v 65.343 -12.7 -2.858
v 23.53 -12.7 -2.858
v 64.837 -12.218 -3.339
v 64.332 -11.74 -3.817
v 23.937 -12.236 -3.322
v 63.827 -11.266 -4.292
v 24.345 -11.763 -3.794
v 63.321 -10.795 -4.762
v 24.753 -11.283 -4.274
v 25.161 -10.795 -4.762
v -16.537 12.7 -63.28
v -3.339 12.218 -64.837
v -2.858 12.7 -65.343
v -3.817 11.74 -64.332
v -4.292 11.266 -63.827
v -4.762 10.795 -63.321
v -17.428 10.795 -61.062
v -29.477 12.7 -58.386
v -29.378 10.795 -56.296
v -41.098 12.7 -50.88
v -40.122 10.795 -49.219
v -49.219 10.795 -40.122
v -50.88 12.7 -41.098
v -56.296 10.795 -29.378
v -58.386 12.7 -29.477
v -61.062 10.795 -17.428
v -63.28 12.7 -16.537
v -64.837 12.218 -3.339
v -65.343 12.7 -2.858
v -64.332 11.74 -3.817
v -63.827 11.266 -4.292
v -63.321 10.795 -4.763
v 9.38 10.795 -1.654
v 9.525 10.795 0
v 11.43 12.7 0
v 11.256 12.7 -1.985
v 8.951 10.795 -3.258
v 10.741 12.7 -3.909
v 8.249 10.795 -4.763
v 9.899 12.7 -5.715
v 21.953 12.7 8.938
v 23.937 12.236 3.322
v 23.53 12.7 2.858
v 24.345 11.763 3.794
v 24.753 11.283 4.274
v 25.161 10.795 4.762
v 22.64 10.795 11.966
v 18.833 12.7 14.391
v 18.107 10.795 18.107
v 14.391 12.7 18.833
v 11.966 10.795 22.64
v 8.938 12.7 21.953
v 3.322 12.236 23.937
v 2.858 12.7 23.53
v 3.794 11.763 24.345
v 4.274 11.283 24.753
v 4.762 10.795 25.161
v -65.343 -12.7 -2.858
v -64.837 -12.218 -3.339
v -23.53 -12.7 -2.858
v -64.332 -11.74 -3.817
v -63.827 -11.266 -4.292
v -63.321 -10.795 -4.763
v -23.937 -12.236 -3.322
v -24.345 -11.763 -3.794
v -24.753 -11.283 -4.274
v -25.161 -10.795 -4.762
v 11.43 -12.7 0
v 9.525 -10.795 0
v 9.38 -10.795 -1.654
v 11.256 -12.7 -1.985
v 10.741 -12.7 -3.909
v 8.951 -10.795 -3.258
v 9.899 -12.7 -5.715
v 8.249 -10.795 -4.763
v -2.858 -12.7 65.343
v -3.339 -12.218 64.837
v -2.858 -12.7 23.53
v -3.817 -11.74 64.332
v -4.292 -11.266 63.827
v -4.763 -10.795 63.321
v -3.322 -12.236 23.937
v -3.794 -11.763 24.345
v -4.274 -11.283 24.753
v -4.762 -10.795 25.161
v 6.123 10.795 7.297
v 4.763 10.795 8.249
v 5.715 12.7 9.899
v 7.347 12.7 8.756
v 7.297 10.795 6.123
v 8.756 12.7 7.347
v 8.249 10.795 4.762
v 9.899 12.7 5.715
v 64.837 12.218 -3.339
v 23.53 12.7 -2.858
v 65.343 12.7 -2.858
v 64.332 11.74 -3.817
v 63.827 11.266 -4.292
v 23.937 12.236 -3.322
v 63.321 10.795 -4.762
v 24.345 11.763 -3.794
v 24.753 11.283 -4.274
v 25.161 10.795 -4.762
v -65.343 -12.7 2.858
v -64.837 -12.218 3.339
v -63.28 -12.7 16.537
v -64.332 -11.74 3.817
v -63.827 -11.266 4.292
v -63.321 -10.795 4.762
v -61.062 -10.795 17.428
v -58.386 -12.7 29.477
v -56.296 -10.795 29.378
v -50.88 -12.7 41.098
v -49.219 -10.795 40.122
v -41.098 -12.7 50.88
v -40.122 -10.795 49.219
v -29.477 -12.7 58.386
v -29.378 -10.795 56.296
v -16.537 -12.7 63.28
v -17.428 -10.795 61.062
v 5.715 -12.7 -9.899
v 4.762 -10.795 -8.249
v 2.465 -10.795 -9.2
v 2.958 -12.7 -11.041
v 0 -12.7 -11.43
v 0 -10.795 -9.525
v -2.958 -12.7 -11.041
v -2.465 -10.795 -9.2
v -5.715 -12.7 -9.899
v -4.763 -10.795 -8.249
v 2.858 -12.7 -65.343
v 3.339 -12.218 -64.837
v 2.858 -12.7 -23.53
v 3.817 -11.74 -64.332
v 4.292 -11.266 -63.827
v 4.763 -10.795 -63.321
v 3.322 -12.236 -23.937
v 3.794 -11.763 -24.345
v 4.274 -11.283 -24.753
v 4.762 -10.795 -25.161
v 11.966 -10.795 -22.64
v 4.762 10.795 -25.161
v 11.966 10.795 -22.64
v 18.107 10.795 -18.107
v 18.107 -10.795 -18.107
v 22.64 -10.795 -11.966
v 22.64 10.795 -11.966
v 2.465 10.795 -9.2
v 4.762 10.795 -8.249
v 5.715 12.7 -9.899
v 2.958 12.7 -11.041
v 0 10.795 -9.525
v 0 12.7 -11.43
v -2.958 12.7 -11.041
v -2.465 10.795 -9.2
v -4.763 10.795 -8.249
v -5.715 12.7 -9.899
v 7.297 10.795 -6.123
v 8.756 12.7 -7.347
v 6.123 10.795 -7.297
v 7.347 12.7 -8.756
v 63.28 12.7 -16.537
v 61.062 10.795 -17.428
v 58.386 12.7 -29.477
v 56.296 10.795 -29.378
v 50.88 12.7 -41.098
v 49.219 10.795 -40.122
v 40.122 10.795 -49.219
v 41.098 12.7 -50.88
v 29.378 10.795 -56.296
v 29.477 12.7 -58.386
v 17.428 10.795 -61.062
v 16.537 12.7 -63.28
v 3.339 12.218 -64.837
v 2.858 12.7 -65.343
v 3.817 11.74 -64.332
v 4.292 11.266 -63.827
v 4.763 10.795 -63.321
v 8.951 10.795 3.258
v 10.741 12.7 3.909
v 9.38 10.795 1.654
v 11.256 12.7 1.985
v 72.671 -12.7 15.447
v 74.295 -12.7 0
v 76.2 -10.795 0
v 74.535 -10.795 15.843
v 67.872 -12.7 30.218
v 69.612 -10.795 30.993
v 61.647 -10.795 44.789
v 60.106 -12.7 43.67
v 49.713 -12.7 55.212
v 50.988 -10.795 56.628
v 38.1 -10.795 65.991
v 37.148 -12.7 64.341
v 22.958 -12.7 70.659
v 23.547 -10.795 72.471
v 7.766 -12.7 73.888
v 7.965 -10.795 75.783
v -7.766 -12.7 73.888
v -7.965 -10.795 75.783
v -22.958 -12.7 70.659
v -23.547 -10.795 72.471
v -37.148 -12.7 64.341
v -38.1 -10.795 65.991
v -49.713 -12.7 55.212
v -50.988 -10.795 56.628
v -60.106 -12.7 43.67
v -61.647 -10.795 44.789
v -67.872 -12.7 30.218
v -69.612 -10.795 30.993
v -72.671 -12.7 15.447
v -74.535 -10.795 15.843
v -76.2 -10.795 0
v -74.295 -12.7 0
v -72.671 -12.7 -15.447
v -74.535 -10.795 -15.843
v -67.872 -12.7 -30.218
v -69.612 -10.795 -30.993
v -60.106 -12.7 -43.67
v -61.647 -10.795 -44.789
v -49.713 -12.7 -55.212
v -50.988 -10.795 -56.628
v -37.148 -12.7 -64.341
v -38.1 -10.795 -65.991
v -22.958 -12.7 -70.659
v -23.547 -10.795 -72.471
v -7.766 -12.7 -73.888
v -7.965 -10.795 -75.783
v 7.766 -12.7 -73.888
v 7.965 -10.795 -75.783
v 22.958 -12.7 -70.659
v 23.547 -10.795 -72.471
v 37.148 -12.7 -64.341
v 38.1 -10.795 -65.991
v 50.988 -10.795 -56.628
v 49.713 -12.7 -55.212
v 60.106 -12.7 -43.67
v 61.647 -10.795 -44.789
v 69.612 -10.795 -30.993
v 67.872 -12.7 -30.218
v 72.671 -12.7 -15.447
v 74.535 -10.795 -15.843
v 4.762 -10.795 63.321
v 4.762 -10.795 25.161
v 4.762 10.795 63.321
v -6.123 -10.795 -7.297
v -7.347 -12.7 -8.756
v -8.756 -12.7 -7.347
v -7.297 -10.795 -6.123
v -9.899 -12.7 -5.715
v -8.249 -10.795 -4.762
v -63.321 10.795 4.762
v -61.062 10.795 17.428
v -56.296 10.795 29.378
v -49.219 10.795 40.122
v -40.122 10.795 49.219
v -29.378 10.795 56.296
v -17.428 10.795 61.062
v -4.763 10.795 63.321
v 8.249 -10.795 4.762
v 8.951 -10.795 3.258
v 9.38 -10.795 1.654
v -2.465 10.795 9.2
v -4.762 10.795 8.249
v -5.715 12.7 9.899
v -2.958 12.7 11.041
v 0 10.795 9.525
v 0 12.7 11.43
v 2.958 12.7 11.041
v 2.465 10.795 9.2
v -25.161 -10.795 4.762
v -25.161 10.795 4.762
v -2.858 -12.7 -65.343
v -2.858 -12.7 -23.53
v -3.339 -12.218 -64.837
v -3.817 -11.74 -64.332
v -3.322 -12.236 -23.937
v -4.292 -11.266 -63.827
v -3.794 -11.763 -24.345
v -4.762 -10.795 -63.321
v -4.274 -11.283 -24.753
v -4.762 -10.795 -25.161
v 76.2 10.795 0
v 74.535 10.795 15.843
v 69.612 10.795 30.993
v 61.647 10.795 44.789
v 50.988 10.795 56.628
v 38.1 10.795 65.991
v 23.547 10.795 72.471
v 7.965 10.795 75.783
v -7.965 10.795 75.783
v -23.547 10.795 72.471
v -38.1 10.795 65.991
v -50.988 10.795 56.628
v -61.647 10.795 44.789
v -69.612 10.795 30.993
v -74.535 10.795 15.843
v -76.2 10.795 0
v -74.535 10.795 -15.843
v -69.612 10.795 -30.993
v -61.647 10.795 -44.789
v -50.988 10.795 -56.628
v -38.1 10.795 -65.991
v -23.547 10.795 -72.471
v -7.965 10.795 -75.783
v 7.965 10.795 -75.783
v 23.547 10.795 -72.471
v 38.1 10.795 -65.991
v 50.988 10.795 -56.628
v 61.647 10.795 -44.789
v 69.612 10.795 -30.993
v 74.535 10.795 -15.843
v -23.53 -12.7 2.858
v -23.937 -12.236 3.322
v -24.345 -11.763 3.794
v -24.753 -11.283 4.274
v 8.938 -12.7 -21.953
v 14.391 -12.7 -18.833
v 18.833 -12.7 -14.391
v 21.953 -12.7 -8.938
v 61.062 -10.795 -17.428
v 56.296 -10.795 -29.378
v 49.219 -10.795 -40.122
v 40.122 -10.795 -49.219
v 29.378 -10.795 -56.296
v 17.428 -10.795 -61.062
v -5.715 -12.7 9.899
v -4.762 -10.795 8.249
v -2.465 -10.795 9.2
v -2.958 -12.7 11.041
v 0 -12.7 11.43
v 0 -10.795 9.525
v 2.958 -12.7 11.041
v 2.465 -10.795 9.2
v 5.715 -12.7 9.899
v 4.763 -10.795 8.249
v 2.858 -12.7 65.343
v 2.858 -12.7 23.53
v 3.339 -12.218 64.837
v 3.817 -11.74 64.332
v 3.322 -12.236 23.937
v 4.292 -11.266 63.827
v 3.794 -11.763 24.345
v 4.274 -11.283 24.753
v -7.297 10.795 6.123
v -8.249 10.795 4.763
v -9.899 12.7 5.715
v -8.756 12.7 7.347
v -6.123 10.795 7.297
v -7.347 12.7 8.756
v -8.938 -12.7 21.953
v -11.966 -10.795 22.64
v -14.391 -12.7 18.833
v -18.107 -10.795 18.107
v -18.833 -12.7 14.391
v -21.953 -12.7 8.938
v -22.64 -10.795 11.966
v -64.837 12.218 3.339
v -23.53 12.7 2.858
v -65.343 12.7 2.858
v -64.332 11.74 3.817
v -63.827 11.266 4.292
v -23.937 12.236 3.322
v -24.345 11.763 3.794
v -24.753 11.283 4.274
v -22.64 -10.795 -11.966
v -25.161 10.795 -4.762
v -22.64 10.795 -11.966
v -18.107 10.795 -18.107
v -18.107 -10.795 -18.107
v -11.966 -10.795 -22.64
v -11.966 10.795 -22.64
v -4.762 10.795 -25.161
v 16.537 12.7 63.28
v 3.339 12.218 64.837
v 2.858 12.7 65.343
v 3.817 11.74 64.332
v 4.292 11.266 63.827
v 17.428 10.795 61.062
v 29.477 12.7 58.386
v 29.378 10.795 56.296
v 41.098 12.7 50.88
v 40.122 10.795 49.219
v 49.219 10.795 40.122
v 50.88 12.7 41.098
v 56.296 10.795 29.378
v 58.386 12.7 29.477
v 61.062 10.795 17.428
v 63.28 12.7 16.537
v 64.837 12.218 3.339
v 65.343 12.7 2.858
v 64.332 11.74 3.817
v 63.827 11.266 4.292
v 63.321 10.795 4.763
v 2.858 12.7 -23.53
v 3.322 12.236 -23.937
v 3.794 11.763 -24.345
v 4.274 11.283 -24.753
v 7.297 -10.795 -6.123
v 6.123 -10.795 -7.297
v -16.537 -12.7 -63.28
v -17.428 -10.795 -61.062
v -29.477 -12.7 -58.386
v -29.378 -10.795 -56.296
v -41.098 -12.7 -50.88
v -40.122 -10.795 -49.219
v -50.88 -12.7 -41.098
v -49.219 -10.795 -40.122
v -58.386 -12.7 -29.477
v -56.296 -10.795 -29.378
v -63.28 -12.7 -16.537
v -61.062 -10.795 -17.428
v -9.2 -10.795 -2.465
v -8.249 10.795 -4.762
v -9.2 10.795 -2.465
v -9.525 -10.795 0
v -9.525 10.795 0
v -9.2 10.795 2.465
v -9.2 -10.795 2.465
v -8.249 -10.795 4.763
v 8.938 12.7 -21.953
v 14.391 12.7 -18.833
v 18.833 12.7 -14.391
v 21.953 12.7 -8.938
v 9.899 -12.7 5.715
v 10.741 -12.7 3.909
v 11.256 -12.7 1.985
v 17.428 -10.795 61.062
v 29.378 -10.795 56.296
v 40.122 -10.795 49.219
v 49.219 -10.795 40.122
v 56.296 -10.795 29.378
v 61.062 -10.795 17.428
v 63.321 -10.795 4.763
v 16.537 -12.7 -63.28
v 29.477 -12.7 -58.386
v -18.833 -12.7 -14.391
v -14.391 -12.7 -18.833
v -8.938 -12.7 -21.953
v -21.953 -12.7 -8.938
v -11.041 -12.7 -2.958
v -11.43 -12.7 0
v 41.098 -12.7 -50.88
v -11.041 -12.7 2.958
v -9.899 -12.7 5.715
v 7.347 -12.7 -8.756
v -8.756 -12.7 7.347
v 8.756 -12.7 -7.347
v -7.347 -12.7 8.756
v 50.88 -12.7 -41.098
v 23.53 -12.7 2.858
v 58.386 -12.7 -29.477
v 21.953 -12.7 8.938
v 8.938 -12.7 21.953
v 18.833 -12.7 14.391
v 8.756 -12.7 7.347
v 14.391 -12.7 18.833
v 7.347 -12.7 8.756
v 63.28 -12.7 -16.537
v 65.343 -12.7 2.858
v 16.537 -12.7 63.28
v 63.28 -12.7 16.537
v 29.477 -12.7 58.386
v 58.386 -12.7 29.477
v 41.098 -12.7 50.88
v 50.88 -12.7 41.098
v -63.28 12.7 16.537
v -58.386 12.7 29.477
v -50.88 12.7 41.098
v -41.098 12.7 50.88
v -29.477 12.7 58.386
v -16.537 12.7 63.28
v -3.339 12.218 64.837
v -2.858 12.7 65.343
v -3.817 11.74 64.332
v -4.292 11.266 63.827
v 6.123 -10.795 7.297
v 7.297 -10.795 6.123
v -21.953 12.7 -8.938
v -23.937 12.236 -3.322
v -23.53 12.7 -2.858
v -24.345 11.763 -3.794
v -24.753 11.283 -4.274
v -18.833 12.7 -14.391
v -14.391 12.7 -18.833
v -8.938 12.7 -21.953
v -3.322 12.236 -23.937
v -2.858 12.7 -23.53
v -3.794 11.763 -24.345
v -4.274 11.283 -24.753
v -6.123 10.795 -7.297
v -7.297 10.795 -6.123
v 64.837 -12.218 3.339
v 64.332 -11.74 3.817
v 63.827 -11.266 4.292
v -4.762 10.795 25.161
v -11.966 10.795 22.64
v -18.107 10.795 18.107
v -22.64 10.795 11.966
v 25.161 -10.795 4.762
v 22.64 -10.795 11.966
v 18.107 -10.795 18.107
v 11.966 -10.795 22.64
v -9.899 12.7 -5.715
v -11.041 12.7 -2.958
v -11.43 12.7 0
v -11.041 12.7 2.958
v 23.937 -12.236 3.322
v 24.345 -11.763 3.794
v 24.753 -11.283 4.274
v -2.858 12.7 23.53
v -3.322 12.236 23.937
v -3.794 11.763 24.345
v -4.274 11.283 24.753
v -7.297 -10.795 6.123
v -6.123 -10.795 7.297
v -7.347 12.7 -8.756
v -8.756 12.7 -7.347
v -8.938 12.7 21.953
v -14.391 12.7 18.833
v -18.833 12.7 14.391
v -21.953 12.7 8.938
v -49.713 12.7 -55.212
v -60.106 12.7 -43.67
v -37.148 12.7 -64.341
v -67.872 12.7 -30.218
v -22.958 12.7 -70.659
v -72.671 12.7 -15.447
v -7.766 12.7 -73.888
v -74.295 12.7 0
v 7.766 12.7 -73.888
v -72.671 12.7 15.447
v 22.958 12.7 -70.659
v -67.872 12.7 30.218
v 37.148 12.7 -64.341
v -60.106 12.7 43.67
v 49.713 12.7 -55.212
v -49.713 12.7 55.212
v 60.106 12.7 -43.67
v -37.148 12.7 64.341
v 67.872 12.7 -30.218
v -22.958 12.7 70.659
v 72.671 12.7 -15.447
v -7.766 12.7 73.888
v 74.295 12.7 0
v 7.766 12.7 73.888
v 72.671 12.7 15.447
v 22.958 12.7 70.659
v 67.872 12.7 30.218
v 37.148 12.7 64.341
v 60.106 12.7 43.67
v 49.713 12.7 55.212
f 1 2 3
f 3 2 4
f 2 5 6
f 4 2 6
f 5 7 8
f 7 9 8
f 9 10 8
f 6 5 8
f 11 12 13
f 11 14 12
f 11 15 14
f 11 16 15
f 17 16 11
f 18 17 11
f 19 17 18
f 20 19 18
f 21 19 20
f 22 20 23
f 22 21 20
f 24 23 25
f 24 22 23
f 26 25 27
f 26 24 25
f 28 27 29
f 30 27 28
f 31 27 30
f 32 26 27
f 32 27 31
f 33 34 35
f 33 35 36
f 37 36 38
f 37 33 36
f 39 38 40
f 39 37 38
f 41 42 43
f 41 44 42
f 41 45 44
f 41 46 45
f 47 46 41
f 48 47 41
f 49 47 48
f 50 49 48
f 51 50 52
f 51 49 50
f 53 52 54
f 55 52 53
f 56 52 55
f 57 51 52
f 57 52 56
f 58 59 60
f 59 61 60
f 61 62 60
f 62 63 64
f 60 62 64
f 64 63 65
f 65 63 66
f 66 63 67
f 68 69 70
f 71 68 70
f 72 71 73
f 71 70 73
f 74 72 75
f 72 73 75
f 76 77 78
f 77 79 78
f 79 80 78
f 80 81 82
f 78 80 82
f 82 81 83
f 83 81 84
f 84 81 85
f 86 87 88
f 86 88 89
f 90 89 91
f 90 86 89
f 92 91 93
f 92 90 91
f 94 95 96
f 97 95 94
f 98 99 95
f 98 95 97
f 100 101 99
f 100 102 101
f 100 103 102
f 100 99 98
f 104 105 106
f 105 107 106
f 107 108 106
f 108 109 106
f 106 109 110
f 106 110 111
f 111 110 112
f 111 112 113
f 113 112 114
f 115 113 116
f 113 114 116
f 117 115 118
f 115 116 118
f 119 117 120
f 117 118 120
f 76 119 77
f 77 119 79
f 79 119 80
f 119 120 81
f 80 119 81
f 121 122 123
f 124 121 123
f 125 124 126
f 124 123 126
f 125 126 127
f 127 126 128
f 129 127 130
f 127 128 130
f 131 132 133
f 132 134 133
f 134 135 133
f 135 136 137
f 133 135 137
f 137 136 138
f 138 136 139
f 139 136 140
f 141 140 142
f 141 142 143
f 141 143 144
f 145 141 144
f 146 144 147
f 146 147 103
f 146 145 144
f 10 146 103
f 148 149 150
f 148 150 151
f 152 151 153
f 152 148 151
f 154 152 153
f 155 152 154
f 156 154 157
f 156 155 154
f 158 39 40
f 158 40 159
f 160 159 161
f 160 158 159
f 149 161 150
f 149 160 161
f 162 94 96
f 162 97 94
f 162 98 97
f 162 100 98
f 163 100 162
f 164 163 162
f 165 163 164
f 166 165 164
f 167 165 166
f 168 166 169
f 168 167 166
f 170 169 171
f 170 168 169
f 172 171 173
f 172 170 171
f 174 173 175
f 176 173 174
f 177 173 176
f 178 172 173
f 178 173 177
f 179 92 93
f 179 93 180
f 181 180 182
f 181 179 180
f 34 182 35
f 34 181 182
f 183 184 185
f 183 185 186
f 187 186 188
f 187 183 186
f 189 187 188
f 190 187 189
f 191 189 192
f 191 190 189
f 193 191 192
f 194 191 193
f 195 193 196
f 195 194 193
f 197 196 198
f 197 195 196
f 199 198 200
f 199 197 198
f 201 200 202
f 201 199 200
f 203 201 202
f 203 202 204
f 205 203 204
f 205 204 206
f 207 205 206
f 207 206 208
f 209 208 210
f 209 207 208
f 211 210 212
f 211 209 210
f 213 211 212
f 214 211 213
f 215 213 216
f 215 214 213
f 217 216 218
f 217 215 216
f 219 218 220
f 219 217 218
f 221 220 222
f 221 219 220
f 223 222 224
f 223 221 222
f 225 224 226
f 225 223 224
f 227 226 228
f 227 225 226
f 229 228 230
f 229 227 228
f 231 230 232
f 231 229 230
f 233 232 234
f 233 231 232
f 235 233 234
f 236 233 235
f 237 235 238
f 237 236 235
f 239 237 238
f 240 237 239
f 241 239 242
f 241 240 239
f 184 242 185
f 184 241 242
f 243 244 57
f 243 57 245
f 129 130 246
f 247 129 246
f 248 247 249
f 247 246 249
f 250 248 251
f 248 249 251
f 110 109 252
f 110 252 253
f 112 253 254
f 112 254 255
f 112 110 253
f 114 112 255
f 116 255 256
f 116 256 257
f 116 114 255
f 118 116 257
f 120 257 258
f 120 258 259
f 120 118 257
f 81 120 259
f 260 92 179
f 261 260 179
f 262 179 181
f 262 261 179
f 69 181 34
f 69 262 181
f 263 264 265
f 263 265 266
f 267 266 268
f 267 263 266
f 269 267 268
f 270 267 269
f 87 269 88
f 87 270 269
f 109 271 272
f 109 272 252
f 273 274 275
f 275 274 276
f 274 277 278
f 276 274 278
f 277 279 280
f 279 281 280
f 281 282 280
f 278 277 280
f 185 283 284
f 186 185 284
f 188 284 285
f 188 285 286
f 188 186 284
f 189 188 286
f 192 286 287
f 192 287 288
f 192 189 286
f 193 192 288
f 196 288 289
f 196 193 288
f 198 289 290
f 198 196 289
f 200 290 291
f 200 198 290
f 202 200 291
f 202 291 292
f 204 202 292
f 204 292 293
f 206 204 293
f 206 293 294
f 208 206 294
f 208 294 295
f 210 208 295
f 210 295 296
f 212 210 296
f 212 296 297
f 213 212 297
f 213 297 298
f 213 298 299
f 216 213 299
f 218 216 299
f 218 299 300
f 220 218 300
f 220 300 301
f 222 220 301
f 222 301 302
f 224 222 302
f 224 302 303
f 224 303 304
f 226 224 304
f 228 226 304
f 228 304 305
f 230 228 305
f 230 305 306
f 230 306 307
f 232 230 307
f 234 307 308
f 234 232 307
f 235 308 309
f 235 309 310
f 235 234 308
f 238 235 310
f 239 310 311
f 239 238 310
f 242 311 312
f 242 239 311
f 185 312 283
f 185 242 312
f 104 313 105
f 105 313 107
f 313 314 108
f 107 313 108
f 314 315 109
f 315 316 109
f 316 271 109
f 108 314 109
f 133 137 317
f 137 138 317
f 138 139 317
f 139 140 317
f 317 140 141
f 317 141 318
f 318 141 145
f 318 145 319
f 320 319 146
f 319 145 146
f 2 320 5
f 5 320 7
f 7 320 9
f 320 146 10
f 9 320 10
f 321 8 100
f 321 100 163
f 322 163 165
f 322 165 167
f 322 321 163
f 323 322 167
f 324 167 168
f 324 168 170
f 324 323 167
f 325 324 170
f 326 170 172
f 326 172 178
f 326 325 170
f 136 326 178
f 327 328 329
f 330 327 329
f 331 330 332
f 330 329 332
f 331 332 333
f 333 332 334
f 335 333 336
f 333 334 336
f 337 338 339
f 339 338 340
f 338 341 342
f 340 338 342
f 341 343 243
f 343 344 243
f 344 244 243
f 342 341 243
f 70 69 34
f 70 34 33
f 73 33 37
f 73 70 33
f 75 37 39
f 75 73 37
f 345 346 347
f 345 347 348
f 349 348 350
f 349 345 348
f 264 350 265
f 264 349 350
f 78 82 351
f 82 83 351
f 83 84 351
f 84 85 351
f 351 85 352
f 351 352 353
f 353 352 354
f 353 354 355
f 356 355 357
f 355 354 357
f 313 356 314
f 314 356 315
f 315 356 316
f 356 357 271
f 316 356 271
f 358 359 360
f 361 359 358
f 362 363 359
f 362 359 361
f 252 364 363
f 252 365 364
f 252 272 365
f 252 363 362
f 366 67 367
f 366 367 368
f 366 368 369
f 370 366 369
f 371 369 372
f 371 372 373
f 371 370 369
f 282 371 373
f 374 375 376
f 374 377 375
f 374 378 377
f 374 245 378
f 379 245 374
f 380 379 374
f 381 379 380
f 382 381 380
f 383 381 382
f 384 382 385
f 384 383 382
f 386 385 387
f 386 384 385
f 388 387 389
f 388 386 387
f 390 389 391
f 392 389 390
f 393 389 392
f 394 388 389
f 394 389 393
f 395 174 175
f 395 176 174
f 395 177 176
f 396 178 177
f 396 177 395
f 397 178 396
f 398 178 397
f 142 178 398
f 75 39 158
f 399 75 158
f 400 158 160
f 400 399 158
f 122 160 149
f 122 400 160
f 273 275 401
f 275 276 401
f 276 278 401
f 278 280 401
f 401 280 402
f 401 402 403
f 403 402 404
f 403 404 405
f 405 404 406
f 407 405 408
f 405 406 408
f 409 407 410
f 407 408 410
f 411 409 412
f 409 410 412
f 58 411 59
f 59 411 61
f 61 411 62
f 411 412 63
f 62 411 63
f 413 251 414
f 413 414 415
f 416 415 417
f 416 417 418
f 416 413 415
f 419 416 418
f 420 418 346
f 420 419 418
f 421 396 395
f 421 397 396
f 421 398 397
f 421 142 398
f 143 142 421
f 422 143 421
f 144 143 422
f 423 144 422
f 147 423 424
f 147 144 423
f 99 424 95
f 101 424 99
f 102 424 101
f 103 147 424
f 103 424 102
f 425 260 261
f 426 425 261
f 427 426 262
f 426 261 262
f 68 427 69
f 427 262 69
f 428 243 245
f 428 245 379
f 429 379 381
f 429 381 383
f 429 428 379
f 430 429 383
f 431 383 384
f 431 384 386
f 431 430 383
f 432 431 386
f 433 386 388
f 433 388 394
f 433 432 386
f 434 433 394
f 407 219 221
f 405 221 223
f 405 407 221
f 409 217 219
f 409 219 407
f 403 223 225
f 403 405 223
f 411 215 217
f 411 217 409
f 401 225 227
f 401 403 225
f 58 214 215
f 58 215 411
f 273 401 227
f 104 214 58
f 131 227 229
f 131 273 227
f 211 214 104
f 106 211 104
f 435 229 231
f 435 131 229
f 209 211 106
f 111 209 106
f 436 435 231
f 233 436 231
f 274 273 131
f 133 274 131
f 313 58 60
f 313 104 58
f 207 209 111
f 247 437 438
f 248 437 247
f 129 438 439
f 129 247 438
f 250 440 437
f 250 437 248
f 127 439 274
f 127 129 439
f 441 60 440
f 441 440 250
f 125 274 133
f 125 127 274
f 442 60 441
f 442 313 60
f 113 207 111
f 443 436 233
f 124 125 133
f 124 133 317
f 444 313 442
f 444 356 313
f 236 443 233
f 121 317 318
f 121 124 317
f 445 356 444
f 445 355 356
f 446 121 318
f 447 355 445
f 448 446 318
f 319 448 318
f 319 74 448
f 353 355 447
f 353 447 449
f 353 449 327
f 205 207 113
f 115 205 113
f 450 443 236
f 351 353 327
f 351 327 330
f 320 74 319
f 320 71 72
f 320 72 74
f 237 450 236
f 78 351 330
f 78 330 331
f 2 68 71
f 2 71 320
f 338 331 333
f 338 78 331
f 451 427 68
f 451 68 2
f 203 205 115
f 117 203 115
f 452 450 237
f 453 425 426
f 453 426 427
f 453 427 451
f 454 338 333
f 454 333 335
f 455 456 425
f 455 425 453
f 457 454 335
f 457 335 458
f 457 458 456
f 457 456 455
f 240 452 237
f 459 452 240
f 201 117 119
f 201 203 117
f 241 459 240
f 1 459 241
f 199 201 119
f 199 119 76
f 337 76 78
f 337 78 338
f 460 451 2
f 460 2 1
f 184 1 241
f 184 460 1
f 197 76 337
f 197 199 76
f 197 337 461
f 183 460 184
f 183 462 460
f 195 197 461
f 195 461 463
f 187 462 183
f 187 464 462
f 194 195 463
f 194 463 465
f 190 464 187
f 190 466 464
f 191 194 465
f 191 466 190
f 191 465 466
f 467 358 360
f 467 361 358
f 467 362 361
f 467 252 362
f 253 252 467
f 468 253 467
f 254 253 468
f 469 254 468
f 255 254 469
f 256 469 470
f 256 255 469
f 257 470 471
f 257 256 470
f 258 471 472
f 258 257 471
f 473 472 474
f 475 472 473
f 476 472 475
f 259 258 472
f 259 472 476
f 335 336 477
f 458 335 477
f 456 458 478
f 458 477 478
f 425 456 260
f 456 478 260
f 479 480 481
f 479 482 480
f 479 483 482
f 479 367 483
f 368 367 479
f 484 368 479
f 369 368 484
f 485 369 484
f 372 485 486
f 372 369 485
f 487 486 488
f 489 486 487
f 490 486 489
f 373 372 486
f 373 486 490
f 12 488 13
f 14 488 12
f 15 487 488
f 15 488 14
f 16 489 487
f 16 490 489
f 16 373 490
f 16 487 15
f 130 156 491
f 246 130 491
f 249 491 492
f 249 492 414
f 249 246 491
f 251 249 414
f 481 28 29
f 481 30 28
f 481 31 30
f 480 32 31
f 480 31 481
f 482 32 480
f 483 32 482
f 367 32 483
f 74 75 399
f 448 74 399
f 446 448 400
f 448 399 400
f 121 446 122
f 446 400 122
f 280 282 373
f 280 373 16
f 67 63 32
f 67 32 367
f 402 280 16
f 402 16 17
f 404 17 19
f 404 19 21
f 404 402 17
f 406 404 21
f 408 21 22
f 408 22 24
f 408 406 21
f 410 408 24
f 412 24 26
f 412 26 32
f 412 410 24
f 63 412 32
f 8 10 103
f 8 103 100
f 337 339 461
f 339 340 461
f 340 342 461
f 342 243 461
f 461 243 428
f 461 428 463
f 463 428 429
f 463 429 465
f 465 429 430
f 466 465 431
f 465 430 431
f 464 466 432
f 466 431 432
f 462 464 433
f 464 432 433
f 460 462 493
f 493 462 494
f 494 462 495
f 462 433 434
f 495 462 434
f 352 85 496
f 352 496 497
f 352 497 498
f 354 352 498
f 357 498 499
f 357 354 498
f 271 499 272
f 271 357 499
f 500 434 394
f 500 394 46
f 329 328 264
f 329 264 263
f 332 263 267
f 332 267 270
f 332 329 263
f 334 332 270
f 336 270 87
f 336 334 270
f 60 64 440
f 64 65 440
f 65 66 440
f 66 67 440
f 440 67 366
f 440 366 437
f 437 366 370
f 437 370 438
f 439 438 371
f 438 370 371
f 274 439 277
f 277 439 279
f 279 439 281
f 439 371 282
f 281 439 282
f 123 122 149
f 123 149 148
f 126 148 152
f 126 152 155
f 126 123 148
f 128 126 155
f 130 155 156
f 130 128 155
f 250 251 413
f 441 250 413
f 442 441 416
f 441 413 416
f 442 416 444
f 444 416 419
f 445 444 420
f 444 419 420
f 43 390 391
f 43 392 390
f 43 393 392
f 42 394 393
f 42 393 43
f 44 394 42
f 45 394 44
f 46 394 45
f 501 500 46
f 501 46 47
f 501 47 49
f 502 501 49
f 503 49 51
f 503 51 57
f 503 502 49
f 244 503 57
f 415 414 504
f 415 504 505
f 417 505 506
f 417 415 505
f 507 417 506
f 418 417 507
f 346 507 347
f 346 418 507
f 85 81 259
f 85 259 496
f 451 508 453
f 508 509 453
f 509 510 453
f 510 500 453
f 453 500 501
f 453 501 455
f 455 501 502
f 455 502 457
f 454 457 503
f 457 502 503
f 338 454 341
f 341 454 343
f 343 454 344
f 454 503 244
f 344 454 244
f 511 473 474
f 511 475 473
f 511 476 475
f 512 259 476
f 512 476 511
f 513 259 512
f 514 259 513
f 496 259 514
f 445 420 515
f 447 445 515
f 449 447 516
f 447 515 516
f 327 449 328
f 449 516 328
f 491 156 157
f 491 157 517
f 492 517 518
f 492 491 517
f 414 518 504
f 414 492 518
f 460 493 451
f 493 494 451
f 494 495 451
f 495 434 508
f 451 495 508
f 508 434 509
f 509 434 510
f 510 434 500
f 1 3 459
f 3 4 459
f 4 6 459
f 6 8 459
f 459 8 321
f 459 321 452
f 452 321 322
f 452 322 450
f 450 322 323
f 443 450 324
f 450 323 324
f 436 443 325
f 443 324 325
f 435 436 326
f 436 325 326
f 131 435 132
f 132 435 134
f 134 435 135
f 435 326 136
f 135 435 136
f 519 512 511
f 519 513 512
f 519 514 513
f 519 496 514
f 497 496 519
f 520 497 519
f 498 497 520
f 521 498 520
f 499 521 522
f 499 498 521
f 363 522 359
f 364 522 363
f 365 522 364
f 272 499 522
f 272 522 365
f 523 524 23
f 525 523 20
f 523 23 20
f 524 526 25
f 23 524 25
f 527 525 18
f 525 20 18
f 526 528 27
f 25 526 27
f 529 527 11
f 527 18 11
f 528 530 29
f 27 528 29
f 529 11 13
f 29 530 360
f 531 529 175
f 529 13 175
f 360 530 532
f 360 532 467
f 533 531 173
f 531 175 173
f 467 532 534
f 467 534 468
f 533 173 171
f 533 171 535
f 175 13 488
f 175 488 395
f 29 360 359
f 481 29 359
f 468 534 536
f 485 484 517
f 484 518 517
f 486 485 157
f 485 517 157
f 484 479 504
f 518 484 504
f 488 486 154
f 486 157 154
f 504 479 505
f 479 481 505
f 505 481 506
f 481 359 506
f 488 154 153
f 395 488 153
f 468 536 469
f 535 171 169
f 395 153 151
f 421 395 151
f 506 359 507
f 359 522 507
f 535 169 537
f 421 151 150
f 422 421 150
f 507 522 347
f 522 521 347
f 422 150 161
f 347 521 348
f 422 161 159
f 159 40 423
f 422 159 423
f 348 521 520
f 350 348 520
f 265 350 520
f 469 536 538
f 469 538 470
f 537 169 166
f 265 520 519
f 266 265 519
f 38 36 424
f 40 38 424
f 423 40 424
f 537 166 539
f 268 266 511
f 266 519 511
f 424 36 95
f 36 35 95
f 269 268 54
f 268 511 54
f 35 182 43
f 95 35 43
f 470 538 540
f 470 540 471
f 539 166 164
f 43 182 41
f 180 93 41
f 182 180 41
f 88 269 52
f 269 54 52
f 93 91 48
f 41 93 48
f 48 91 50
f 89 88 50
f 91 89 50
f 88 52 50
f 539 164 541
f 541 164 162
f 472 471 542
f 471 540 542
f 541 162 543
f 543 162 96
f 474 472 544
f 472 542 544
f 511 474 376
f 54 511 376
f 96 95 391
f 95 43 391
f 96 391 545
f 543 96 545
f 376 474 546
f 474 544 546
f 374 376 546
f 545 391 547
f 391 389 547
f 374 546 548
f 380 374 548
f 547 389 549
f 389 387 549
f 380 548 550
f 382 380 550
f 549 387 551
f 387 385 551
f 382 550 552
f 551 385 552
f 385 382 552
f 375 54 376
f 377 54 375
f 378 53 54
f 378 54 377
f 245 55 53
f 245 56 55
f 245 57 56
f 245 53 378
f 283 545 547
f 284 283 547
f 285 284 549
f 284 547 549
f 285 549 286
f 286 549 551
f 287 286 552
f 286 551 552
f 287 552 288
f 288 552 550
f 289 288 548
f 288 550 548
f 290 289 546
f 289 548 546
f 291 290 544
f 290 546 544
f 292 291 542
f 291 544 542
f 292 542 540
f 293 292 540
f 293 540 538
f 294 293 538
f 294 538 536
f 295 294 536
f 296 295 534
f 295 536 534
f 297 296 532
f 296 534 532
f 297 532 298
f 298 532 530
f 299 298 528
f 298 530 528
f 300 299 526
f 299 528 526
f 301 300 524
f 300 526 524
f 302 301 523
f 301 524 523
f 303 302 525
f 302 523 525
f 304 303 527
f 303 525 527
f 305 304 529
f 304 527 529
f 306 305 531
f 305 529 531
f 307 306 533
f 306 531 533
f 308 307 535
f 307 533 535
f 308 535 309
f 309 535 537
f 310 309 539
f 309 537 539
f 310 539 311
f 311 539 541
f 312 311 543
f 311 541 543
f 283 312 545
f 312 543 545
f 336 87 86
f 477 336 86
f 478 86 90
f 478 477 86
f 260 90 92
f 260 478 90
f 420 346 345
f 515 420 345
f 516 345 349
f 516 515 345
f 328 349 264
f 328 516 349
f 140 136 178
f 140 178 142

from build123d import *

# Parameters (mm, degrees)
F0_R     = 76.2
F1_DEPTH = 12.7
F2_SIZE  = 1.905
F3_SIZE  = 1.905


with BuildPart() as f1:
    # F0 (on Front) → F1 (new body, symmetric)
    with BuildSketch(Plane.XZ):
        Circle(F0_R)
        with BuildLine():
            ThreePointArc((-4.7625, -63.321154), (-44.901281, -44.901281), (-63.321154, -4.7625))
            Line((-63.321154, -4.7625), (-25.160792, -4.7625))
            Line((-25.160792, -4.7625), (-8.248892, -4.7625))
            ThreePointArc((-8.248892, -4.7625), (-9.525, 0), (-8.248892, 4.7625))
            Line((-8.248892, 4.7625), (-25.160792, 4.7625))
            Line((-25.160792, 4.7625), (-63.321154, 4.7625))
            ThreePointArc((-63.321154, 4.7625), (-44.901281, 44.901281), (-4.7625, 63.321154))
            Line((-4.7625, 63.321154), (-4.7625, 25.160792))
            Line((-4.7625, 25.160792), (-4.7625, 8.248892))
            ThreePointArc((-4.7625, 8.248892), (0, 9.525), (4.7625, 8.248892))
            Line((4.7625, 8.248892), (4.7625, 25.160792))
            Line((4.7625, 25.160792), (4.7625, 63.321154))
            ThreePointArc((4.7625, 63.321154), (44.901281, 44.901281), (63.321154, 4.7625))
            Line((63.321154, 4.7625), (25.160792, 4.7625))
            Line((25.160792, 4.7625), (8.248892, 4.7625))
            ThreePointArc((8.248892, 4.7625), (9.200443, 2.465251), (9.525, 0))
            ThreePointArc((9.525, 0), (9.200443, -2.465251), (8.248892, -4.7625))
            Line((8.248892, -4.7625), (25.160792, -4.7625))
            Line((25.160792, -4.7625), (63.321154, -4.7625))
            ThreePointArc((63.321154, -4.7625), (44.901281, -44.901281), (4.7625, -63.321154))
            Line((4.7625, -63.321154), (4.7625, -25.160792))
            Line((4.7625, -25.160792), (4.7625, -8.248892))
            ThreePointArc((4.7625, -8.248892), (0, -9.525), (-4.7625, -8.248892))
            Line((-4.7625, -8.248892), (-4.7625, -25.160792))
            Line((-4.7625, -25.160792), (-4.7625, -63.321154))
        make_face(mode=Mode.SUBTRACT)
        with BuildLine():
            Line((-25.160792, 4.7625), (-8.248892, 4.7625))
            ThreePointArc((-8.248892, 4.7625), (-6.735192, 6.735192), (-4.7625, 8.248892))
            Line((-4.7625, 8.248892), (-4.7625, 25.160792))
            ThreePointArc((-4.7625, 25.160792), (-18.107275, 18.107275), (-25.160792, 4.7625))
        make_face()
        with BuildLine():
            Line((4.7625, 25.160792), (4.7625, 8.248892))
            ThreePointArc((4.7625, 8.248892), (6.735192, 6.735192), (8.248892, 4.7625))
            Line((8.248892, 4.7625), (25.160792, 4.7625))
            ThreePointArc((25.160792, 4.7625), (18.107275, 18.107275), (4.7625, 25.160792))
        make_face()
        with BuildLine():
            ThreePointArc((8.248892, -4.7625), (6.735192, -6.735192), (4.7625, -8.248892))
            Line((4.7625, -8.248892), (4.7625, -25.160792))
            ThreePointArc((4.7625, -25.160792), (18.107275, -18.107275), (25.160792, -4.7625))
            Line((25.160792, -4.7625), (8.248892, -4.7625))
        make_face()
        with BuildLine():
            Line((-8.248892, -4.7625), (-25.160792, -4.7625))
            ThreePointArc((-25.160792, -4.7625), (-18.107275, -18.107275), (-4.7625, -25.160792))
            Line((-4.7625, -25.160792), (-4.7625, -8.248892))
            ThreePointArc((-4.7625, -8.248892), (-6.735192, -6.735192), (-8.248892, -4.7625))
        make_face()
    extrude(amount=F1_DEPTH, both=True)

    # F2
    f2_edges = [f1.edges().sort_by_distance(p)[0] for p in [
        (-76.2, -12.7, 0),
        (-4.7625, -12.7, -44.240973),
        (-44.901281, -12.7, -44.901281),
        (-44.240973, -12.7, -4.7625),
        (-18.107275, -12.7, -18.107275),
        (4.7625, -12.7, 8.248892),
        (44.240973, -12.7, -4.7625),
        (44.901281, -12.7, -44.901281),
        (4.7625, -12.7, -44.240973),
        (18.107275, -12.7, -18.107275),
        (4.7625, -12.7, 44.240973),
        (44.901281, -12.7, 44.901281),
        (44.240973, -12.7, 4.7625),
        (18.107275, -12.7, 18.107275),
        (-44.240973, -12.7, 4.7625),
        (-44.901281, -12.7, 44.901281),
        (-4.7625, -12.7, 44.240973),
        (-18.107275, -12.7, 18.107275),
    ]]
    chamfer(f2_edges, length=F2_SIZE)

    # F3
    f3_edges = [f1.edges().sort_by_distance(p)[0] for p in [
        (-76.2, 12.7, 0),
        (4.7625, 12.7, 8.248892),
        (-4.7625, 12.7, -44.240973),
        (-44.901281, 12.7, -44.901281),
        (-44.240973, 12.7, -4.7625),
        (-18.107275, 12.7, -18.107275),
        (44.240973, 12.7, -4.7625),
        (44.901281, 12.7, -44.901281),
        (4.7625, 12.7, -44.240973),
        (18.107275, 12.7, -18.107275),
        (4.7625, 12.7, 44.240973),
        (44.901281, 12.7, 44.901281),
        (44.240973, 12.7, 4.7625),
        (18.107275, 12.7, 18.107275),
        (-44.240973, 12.7, 4.7625),
        (-44.901281, 12.7, 44.901281),
        (-4.7625, 12.7, 44.240973),
        (-18.107275, 12.7, 18.107275),
    ]]
    chamfer(f3_edges, length=F3_SIZE)


solid = f1.part
